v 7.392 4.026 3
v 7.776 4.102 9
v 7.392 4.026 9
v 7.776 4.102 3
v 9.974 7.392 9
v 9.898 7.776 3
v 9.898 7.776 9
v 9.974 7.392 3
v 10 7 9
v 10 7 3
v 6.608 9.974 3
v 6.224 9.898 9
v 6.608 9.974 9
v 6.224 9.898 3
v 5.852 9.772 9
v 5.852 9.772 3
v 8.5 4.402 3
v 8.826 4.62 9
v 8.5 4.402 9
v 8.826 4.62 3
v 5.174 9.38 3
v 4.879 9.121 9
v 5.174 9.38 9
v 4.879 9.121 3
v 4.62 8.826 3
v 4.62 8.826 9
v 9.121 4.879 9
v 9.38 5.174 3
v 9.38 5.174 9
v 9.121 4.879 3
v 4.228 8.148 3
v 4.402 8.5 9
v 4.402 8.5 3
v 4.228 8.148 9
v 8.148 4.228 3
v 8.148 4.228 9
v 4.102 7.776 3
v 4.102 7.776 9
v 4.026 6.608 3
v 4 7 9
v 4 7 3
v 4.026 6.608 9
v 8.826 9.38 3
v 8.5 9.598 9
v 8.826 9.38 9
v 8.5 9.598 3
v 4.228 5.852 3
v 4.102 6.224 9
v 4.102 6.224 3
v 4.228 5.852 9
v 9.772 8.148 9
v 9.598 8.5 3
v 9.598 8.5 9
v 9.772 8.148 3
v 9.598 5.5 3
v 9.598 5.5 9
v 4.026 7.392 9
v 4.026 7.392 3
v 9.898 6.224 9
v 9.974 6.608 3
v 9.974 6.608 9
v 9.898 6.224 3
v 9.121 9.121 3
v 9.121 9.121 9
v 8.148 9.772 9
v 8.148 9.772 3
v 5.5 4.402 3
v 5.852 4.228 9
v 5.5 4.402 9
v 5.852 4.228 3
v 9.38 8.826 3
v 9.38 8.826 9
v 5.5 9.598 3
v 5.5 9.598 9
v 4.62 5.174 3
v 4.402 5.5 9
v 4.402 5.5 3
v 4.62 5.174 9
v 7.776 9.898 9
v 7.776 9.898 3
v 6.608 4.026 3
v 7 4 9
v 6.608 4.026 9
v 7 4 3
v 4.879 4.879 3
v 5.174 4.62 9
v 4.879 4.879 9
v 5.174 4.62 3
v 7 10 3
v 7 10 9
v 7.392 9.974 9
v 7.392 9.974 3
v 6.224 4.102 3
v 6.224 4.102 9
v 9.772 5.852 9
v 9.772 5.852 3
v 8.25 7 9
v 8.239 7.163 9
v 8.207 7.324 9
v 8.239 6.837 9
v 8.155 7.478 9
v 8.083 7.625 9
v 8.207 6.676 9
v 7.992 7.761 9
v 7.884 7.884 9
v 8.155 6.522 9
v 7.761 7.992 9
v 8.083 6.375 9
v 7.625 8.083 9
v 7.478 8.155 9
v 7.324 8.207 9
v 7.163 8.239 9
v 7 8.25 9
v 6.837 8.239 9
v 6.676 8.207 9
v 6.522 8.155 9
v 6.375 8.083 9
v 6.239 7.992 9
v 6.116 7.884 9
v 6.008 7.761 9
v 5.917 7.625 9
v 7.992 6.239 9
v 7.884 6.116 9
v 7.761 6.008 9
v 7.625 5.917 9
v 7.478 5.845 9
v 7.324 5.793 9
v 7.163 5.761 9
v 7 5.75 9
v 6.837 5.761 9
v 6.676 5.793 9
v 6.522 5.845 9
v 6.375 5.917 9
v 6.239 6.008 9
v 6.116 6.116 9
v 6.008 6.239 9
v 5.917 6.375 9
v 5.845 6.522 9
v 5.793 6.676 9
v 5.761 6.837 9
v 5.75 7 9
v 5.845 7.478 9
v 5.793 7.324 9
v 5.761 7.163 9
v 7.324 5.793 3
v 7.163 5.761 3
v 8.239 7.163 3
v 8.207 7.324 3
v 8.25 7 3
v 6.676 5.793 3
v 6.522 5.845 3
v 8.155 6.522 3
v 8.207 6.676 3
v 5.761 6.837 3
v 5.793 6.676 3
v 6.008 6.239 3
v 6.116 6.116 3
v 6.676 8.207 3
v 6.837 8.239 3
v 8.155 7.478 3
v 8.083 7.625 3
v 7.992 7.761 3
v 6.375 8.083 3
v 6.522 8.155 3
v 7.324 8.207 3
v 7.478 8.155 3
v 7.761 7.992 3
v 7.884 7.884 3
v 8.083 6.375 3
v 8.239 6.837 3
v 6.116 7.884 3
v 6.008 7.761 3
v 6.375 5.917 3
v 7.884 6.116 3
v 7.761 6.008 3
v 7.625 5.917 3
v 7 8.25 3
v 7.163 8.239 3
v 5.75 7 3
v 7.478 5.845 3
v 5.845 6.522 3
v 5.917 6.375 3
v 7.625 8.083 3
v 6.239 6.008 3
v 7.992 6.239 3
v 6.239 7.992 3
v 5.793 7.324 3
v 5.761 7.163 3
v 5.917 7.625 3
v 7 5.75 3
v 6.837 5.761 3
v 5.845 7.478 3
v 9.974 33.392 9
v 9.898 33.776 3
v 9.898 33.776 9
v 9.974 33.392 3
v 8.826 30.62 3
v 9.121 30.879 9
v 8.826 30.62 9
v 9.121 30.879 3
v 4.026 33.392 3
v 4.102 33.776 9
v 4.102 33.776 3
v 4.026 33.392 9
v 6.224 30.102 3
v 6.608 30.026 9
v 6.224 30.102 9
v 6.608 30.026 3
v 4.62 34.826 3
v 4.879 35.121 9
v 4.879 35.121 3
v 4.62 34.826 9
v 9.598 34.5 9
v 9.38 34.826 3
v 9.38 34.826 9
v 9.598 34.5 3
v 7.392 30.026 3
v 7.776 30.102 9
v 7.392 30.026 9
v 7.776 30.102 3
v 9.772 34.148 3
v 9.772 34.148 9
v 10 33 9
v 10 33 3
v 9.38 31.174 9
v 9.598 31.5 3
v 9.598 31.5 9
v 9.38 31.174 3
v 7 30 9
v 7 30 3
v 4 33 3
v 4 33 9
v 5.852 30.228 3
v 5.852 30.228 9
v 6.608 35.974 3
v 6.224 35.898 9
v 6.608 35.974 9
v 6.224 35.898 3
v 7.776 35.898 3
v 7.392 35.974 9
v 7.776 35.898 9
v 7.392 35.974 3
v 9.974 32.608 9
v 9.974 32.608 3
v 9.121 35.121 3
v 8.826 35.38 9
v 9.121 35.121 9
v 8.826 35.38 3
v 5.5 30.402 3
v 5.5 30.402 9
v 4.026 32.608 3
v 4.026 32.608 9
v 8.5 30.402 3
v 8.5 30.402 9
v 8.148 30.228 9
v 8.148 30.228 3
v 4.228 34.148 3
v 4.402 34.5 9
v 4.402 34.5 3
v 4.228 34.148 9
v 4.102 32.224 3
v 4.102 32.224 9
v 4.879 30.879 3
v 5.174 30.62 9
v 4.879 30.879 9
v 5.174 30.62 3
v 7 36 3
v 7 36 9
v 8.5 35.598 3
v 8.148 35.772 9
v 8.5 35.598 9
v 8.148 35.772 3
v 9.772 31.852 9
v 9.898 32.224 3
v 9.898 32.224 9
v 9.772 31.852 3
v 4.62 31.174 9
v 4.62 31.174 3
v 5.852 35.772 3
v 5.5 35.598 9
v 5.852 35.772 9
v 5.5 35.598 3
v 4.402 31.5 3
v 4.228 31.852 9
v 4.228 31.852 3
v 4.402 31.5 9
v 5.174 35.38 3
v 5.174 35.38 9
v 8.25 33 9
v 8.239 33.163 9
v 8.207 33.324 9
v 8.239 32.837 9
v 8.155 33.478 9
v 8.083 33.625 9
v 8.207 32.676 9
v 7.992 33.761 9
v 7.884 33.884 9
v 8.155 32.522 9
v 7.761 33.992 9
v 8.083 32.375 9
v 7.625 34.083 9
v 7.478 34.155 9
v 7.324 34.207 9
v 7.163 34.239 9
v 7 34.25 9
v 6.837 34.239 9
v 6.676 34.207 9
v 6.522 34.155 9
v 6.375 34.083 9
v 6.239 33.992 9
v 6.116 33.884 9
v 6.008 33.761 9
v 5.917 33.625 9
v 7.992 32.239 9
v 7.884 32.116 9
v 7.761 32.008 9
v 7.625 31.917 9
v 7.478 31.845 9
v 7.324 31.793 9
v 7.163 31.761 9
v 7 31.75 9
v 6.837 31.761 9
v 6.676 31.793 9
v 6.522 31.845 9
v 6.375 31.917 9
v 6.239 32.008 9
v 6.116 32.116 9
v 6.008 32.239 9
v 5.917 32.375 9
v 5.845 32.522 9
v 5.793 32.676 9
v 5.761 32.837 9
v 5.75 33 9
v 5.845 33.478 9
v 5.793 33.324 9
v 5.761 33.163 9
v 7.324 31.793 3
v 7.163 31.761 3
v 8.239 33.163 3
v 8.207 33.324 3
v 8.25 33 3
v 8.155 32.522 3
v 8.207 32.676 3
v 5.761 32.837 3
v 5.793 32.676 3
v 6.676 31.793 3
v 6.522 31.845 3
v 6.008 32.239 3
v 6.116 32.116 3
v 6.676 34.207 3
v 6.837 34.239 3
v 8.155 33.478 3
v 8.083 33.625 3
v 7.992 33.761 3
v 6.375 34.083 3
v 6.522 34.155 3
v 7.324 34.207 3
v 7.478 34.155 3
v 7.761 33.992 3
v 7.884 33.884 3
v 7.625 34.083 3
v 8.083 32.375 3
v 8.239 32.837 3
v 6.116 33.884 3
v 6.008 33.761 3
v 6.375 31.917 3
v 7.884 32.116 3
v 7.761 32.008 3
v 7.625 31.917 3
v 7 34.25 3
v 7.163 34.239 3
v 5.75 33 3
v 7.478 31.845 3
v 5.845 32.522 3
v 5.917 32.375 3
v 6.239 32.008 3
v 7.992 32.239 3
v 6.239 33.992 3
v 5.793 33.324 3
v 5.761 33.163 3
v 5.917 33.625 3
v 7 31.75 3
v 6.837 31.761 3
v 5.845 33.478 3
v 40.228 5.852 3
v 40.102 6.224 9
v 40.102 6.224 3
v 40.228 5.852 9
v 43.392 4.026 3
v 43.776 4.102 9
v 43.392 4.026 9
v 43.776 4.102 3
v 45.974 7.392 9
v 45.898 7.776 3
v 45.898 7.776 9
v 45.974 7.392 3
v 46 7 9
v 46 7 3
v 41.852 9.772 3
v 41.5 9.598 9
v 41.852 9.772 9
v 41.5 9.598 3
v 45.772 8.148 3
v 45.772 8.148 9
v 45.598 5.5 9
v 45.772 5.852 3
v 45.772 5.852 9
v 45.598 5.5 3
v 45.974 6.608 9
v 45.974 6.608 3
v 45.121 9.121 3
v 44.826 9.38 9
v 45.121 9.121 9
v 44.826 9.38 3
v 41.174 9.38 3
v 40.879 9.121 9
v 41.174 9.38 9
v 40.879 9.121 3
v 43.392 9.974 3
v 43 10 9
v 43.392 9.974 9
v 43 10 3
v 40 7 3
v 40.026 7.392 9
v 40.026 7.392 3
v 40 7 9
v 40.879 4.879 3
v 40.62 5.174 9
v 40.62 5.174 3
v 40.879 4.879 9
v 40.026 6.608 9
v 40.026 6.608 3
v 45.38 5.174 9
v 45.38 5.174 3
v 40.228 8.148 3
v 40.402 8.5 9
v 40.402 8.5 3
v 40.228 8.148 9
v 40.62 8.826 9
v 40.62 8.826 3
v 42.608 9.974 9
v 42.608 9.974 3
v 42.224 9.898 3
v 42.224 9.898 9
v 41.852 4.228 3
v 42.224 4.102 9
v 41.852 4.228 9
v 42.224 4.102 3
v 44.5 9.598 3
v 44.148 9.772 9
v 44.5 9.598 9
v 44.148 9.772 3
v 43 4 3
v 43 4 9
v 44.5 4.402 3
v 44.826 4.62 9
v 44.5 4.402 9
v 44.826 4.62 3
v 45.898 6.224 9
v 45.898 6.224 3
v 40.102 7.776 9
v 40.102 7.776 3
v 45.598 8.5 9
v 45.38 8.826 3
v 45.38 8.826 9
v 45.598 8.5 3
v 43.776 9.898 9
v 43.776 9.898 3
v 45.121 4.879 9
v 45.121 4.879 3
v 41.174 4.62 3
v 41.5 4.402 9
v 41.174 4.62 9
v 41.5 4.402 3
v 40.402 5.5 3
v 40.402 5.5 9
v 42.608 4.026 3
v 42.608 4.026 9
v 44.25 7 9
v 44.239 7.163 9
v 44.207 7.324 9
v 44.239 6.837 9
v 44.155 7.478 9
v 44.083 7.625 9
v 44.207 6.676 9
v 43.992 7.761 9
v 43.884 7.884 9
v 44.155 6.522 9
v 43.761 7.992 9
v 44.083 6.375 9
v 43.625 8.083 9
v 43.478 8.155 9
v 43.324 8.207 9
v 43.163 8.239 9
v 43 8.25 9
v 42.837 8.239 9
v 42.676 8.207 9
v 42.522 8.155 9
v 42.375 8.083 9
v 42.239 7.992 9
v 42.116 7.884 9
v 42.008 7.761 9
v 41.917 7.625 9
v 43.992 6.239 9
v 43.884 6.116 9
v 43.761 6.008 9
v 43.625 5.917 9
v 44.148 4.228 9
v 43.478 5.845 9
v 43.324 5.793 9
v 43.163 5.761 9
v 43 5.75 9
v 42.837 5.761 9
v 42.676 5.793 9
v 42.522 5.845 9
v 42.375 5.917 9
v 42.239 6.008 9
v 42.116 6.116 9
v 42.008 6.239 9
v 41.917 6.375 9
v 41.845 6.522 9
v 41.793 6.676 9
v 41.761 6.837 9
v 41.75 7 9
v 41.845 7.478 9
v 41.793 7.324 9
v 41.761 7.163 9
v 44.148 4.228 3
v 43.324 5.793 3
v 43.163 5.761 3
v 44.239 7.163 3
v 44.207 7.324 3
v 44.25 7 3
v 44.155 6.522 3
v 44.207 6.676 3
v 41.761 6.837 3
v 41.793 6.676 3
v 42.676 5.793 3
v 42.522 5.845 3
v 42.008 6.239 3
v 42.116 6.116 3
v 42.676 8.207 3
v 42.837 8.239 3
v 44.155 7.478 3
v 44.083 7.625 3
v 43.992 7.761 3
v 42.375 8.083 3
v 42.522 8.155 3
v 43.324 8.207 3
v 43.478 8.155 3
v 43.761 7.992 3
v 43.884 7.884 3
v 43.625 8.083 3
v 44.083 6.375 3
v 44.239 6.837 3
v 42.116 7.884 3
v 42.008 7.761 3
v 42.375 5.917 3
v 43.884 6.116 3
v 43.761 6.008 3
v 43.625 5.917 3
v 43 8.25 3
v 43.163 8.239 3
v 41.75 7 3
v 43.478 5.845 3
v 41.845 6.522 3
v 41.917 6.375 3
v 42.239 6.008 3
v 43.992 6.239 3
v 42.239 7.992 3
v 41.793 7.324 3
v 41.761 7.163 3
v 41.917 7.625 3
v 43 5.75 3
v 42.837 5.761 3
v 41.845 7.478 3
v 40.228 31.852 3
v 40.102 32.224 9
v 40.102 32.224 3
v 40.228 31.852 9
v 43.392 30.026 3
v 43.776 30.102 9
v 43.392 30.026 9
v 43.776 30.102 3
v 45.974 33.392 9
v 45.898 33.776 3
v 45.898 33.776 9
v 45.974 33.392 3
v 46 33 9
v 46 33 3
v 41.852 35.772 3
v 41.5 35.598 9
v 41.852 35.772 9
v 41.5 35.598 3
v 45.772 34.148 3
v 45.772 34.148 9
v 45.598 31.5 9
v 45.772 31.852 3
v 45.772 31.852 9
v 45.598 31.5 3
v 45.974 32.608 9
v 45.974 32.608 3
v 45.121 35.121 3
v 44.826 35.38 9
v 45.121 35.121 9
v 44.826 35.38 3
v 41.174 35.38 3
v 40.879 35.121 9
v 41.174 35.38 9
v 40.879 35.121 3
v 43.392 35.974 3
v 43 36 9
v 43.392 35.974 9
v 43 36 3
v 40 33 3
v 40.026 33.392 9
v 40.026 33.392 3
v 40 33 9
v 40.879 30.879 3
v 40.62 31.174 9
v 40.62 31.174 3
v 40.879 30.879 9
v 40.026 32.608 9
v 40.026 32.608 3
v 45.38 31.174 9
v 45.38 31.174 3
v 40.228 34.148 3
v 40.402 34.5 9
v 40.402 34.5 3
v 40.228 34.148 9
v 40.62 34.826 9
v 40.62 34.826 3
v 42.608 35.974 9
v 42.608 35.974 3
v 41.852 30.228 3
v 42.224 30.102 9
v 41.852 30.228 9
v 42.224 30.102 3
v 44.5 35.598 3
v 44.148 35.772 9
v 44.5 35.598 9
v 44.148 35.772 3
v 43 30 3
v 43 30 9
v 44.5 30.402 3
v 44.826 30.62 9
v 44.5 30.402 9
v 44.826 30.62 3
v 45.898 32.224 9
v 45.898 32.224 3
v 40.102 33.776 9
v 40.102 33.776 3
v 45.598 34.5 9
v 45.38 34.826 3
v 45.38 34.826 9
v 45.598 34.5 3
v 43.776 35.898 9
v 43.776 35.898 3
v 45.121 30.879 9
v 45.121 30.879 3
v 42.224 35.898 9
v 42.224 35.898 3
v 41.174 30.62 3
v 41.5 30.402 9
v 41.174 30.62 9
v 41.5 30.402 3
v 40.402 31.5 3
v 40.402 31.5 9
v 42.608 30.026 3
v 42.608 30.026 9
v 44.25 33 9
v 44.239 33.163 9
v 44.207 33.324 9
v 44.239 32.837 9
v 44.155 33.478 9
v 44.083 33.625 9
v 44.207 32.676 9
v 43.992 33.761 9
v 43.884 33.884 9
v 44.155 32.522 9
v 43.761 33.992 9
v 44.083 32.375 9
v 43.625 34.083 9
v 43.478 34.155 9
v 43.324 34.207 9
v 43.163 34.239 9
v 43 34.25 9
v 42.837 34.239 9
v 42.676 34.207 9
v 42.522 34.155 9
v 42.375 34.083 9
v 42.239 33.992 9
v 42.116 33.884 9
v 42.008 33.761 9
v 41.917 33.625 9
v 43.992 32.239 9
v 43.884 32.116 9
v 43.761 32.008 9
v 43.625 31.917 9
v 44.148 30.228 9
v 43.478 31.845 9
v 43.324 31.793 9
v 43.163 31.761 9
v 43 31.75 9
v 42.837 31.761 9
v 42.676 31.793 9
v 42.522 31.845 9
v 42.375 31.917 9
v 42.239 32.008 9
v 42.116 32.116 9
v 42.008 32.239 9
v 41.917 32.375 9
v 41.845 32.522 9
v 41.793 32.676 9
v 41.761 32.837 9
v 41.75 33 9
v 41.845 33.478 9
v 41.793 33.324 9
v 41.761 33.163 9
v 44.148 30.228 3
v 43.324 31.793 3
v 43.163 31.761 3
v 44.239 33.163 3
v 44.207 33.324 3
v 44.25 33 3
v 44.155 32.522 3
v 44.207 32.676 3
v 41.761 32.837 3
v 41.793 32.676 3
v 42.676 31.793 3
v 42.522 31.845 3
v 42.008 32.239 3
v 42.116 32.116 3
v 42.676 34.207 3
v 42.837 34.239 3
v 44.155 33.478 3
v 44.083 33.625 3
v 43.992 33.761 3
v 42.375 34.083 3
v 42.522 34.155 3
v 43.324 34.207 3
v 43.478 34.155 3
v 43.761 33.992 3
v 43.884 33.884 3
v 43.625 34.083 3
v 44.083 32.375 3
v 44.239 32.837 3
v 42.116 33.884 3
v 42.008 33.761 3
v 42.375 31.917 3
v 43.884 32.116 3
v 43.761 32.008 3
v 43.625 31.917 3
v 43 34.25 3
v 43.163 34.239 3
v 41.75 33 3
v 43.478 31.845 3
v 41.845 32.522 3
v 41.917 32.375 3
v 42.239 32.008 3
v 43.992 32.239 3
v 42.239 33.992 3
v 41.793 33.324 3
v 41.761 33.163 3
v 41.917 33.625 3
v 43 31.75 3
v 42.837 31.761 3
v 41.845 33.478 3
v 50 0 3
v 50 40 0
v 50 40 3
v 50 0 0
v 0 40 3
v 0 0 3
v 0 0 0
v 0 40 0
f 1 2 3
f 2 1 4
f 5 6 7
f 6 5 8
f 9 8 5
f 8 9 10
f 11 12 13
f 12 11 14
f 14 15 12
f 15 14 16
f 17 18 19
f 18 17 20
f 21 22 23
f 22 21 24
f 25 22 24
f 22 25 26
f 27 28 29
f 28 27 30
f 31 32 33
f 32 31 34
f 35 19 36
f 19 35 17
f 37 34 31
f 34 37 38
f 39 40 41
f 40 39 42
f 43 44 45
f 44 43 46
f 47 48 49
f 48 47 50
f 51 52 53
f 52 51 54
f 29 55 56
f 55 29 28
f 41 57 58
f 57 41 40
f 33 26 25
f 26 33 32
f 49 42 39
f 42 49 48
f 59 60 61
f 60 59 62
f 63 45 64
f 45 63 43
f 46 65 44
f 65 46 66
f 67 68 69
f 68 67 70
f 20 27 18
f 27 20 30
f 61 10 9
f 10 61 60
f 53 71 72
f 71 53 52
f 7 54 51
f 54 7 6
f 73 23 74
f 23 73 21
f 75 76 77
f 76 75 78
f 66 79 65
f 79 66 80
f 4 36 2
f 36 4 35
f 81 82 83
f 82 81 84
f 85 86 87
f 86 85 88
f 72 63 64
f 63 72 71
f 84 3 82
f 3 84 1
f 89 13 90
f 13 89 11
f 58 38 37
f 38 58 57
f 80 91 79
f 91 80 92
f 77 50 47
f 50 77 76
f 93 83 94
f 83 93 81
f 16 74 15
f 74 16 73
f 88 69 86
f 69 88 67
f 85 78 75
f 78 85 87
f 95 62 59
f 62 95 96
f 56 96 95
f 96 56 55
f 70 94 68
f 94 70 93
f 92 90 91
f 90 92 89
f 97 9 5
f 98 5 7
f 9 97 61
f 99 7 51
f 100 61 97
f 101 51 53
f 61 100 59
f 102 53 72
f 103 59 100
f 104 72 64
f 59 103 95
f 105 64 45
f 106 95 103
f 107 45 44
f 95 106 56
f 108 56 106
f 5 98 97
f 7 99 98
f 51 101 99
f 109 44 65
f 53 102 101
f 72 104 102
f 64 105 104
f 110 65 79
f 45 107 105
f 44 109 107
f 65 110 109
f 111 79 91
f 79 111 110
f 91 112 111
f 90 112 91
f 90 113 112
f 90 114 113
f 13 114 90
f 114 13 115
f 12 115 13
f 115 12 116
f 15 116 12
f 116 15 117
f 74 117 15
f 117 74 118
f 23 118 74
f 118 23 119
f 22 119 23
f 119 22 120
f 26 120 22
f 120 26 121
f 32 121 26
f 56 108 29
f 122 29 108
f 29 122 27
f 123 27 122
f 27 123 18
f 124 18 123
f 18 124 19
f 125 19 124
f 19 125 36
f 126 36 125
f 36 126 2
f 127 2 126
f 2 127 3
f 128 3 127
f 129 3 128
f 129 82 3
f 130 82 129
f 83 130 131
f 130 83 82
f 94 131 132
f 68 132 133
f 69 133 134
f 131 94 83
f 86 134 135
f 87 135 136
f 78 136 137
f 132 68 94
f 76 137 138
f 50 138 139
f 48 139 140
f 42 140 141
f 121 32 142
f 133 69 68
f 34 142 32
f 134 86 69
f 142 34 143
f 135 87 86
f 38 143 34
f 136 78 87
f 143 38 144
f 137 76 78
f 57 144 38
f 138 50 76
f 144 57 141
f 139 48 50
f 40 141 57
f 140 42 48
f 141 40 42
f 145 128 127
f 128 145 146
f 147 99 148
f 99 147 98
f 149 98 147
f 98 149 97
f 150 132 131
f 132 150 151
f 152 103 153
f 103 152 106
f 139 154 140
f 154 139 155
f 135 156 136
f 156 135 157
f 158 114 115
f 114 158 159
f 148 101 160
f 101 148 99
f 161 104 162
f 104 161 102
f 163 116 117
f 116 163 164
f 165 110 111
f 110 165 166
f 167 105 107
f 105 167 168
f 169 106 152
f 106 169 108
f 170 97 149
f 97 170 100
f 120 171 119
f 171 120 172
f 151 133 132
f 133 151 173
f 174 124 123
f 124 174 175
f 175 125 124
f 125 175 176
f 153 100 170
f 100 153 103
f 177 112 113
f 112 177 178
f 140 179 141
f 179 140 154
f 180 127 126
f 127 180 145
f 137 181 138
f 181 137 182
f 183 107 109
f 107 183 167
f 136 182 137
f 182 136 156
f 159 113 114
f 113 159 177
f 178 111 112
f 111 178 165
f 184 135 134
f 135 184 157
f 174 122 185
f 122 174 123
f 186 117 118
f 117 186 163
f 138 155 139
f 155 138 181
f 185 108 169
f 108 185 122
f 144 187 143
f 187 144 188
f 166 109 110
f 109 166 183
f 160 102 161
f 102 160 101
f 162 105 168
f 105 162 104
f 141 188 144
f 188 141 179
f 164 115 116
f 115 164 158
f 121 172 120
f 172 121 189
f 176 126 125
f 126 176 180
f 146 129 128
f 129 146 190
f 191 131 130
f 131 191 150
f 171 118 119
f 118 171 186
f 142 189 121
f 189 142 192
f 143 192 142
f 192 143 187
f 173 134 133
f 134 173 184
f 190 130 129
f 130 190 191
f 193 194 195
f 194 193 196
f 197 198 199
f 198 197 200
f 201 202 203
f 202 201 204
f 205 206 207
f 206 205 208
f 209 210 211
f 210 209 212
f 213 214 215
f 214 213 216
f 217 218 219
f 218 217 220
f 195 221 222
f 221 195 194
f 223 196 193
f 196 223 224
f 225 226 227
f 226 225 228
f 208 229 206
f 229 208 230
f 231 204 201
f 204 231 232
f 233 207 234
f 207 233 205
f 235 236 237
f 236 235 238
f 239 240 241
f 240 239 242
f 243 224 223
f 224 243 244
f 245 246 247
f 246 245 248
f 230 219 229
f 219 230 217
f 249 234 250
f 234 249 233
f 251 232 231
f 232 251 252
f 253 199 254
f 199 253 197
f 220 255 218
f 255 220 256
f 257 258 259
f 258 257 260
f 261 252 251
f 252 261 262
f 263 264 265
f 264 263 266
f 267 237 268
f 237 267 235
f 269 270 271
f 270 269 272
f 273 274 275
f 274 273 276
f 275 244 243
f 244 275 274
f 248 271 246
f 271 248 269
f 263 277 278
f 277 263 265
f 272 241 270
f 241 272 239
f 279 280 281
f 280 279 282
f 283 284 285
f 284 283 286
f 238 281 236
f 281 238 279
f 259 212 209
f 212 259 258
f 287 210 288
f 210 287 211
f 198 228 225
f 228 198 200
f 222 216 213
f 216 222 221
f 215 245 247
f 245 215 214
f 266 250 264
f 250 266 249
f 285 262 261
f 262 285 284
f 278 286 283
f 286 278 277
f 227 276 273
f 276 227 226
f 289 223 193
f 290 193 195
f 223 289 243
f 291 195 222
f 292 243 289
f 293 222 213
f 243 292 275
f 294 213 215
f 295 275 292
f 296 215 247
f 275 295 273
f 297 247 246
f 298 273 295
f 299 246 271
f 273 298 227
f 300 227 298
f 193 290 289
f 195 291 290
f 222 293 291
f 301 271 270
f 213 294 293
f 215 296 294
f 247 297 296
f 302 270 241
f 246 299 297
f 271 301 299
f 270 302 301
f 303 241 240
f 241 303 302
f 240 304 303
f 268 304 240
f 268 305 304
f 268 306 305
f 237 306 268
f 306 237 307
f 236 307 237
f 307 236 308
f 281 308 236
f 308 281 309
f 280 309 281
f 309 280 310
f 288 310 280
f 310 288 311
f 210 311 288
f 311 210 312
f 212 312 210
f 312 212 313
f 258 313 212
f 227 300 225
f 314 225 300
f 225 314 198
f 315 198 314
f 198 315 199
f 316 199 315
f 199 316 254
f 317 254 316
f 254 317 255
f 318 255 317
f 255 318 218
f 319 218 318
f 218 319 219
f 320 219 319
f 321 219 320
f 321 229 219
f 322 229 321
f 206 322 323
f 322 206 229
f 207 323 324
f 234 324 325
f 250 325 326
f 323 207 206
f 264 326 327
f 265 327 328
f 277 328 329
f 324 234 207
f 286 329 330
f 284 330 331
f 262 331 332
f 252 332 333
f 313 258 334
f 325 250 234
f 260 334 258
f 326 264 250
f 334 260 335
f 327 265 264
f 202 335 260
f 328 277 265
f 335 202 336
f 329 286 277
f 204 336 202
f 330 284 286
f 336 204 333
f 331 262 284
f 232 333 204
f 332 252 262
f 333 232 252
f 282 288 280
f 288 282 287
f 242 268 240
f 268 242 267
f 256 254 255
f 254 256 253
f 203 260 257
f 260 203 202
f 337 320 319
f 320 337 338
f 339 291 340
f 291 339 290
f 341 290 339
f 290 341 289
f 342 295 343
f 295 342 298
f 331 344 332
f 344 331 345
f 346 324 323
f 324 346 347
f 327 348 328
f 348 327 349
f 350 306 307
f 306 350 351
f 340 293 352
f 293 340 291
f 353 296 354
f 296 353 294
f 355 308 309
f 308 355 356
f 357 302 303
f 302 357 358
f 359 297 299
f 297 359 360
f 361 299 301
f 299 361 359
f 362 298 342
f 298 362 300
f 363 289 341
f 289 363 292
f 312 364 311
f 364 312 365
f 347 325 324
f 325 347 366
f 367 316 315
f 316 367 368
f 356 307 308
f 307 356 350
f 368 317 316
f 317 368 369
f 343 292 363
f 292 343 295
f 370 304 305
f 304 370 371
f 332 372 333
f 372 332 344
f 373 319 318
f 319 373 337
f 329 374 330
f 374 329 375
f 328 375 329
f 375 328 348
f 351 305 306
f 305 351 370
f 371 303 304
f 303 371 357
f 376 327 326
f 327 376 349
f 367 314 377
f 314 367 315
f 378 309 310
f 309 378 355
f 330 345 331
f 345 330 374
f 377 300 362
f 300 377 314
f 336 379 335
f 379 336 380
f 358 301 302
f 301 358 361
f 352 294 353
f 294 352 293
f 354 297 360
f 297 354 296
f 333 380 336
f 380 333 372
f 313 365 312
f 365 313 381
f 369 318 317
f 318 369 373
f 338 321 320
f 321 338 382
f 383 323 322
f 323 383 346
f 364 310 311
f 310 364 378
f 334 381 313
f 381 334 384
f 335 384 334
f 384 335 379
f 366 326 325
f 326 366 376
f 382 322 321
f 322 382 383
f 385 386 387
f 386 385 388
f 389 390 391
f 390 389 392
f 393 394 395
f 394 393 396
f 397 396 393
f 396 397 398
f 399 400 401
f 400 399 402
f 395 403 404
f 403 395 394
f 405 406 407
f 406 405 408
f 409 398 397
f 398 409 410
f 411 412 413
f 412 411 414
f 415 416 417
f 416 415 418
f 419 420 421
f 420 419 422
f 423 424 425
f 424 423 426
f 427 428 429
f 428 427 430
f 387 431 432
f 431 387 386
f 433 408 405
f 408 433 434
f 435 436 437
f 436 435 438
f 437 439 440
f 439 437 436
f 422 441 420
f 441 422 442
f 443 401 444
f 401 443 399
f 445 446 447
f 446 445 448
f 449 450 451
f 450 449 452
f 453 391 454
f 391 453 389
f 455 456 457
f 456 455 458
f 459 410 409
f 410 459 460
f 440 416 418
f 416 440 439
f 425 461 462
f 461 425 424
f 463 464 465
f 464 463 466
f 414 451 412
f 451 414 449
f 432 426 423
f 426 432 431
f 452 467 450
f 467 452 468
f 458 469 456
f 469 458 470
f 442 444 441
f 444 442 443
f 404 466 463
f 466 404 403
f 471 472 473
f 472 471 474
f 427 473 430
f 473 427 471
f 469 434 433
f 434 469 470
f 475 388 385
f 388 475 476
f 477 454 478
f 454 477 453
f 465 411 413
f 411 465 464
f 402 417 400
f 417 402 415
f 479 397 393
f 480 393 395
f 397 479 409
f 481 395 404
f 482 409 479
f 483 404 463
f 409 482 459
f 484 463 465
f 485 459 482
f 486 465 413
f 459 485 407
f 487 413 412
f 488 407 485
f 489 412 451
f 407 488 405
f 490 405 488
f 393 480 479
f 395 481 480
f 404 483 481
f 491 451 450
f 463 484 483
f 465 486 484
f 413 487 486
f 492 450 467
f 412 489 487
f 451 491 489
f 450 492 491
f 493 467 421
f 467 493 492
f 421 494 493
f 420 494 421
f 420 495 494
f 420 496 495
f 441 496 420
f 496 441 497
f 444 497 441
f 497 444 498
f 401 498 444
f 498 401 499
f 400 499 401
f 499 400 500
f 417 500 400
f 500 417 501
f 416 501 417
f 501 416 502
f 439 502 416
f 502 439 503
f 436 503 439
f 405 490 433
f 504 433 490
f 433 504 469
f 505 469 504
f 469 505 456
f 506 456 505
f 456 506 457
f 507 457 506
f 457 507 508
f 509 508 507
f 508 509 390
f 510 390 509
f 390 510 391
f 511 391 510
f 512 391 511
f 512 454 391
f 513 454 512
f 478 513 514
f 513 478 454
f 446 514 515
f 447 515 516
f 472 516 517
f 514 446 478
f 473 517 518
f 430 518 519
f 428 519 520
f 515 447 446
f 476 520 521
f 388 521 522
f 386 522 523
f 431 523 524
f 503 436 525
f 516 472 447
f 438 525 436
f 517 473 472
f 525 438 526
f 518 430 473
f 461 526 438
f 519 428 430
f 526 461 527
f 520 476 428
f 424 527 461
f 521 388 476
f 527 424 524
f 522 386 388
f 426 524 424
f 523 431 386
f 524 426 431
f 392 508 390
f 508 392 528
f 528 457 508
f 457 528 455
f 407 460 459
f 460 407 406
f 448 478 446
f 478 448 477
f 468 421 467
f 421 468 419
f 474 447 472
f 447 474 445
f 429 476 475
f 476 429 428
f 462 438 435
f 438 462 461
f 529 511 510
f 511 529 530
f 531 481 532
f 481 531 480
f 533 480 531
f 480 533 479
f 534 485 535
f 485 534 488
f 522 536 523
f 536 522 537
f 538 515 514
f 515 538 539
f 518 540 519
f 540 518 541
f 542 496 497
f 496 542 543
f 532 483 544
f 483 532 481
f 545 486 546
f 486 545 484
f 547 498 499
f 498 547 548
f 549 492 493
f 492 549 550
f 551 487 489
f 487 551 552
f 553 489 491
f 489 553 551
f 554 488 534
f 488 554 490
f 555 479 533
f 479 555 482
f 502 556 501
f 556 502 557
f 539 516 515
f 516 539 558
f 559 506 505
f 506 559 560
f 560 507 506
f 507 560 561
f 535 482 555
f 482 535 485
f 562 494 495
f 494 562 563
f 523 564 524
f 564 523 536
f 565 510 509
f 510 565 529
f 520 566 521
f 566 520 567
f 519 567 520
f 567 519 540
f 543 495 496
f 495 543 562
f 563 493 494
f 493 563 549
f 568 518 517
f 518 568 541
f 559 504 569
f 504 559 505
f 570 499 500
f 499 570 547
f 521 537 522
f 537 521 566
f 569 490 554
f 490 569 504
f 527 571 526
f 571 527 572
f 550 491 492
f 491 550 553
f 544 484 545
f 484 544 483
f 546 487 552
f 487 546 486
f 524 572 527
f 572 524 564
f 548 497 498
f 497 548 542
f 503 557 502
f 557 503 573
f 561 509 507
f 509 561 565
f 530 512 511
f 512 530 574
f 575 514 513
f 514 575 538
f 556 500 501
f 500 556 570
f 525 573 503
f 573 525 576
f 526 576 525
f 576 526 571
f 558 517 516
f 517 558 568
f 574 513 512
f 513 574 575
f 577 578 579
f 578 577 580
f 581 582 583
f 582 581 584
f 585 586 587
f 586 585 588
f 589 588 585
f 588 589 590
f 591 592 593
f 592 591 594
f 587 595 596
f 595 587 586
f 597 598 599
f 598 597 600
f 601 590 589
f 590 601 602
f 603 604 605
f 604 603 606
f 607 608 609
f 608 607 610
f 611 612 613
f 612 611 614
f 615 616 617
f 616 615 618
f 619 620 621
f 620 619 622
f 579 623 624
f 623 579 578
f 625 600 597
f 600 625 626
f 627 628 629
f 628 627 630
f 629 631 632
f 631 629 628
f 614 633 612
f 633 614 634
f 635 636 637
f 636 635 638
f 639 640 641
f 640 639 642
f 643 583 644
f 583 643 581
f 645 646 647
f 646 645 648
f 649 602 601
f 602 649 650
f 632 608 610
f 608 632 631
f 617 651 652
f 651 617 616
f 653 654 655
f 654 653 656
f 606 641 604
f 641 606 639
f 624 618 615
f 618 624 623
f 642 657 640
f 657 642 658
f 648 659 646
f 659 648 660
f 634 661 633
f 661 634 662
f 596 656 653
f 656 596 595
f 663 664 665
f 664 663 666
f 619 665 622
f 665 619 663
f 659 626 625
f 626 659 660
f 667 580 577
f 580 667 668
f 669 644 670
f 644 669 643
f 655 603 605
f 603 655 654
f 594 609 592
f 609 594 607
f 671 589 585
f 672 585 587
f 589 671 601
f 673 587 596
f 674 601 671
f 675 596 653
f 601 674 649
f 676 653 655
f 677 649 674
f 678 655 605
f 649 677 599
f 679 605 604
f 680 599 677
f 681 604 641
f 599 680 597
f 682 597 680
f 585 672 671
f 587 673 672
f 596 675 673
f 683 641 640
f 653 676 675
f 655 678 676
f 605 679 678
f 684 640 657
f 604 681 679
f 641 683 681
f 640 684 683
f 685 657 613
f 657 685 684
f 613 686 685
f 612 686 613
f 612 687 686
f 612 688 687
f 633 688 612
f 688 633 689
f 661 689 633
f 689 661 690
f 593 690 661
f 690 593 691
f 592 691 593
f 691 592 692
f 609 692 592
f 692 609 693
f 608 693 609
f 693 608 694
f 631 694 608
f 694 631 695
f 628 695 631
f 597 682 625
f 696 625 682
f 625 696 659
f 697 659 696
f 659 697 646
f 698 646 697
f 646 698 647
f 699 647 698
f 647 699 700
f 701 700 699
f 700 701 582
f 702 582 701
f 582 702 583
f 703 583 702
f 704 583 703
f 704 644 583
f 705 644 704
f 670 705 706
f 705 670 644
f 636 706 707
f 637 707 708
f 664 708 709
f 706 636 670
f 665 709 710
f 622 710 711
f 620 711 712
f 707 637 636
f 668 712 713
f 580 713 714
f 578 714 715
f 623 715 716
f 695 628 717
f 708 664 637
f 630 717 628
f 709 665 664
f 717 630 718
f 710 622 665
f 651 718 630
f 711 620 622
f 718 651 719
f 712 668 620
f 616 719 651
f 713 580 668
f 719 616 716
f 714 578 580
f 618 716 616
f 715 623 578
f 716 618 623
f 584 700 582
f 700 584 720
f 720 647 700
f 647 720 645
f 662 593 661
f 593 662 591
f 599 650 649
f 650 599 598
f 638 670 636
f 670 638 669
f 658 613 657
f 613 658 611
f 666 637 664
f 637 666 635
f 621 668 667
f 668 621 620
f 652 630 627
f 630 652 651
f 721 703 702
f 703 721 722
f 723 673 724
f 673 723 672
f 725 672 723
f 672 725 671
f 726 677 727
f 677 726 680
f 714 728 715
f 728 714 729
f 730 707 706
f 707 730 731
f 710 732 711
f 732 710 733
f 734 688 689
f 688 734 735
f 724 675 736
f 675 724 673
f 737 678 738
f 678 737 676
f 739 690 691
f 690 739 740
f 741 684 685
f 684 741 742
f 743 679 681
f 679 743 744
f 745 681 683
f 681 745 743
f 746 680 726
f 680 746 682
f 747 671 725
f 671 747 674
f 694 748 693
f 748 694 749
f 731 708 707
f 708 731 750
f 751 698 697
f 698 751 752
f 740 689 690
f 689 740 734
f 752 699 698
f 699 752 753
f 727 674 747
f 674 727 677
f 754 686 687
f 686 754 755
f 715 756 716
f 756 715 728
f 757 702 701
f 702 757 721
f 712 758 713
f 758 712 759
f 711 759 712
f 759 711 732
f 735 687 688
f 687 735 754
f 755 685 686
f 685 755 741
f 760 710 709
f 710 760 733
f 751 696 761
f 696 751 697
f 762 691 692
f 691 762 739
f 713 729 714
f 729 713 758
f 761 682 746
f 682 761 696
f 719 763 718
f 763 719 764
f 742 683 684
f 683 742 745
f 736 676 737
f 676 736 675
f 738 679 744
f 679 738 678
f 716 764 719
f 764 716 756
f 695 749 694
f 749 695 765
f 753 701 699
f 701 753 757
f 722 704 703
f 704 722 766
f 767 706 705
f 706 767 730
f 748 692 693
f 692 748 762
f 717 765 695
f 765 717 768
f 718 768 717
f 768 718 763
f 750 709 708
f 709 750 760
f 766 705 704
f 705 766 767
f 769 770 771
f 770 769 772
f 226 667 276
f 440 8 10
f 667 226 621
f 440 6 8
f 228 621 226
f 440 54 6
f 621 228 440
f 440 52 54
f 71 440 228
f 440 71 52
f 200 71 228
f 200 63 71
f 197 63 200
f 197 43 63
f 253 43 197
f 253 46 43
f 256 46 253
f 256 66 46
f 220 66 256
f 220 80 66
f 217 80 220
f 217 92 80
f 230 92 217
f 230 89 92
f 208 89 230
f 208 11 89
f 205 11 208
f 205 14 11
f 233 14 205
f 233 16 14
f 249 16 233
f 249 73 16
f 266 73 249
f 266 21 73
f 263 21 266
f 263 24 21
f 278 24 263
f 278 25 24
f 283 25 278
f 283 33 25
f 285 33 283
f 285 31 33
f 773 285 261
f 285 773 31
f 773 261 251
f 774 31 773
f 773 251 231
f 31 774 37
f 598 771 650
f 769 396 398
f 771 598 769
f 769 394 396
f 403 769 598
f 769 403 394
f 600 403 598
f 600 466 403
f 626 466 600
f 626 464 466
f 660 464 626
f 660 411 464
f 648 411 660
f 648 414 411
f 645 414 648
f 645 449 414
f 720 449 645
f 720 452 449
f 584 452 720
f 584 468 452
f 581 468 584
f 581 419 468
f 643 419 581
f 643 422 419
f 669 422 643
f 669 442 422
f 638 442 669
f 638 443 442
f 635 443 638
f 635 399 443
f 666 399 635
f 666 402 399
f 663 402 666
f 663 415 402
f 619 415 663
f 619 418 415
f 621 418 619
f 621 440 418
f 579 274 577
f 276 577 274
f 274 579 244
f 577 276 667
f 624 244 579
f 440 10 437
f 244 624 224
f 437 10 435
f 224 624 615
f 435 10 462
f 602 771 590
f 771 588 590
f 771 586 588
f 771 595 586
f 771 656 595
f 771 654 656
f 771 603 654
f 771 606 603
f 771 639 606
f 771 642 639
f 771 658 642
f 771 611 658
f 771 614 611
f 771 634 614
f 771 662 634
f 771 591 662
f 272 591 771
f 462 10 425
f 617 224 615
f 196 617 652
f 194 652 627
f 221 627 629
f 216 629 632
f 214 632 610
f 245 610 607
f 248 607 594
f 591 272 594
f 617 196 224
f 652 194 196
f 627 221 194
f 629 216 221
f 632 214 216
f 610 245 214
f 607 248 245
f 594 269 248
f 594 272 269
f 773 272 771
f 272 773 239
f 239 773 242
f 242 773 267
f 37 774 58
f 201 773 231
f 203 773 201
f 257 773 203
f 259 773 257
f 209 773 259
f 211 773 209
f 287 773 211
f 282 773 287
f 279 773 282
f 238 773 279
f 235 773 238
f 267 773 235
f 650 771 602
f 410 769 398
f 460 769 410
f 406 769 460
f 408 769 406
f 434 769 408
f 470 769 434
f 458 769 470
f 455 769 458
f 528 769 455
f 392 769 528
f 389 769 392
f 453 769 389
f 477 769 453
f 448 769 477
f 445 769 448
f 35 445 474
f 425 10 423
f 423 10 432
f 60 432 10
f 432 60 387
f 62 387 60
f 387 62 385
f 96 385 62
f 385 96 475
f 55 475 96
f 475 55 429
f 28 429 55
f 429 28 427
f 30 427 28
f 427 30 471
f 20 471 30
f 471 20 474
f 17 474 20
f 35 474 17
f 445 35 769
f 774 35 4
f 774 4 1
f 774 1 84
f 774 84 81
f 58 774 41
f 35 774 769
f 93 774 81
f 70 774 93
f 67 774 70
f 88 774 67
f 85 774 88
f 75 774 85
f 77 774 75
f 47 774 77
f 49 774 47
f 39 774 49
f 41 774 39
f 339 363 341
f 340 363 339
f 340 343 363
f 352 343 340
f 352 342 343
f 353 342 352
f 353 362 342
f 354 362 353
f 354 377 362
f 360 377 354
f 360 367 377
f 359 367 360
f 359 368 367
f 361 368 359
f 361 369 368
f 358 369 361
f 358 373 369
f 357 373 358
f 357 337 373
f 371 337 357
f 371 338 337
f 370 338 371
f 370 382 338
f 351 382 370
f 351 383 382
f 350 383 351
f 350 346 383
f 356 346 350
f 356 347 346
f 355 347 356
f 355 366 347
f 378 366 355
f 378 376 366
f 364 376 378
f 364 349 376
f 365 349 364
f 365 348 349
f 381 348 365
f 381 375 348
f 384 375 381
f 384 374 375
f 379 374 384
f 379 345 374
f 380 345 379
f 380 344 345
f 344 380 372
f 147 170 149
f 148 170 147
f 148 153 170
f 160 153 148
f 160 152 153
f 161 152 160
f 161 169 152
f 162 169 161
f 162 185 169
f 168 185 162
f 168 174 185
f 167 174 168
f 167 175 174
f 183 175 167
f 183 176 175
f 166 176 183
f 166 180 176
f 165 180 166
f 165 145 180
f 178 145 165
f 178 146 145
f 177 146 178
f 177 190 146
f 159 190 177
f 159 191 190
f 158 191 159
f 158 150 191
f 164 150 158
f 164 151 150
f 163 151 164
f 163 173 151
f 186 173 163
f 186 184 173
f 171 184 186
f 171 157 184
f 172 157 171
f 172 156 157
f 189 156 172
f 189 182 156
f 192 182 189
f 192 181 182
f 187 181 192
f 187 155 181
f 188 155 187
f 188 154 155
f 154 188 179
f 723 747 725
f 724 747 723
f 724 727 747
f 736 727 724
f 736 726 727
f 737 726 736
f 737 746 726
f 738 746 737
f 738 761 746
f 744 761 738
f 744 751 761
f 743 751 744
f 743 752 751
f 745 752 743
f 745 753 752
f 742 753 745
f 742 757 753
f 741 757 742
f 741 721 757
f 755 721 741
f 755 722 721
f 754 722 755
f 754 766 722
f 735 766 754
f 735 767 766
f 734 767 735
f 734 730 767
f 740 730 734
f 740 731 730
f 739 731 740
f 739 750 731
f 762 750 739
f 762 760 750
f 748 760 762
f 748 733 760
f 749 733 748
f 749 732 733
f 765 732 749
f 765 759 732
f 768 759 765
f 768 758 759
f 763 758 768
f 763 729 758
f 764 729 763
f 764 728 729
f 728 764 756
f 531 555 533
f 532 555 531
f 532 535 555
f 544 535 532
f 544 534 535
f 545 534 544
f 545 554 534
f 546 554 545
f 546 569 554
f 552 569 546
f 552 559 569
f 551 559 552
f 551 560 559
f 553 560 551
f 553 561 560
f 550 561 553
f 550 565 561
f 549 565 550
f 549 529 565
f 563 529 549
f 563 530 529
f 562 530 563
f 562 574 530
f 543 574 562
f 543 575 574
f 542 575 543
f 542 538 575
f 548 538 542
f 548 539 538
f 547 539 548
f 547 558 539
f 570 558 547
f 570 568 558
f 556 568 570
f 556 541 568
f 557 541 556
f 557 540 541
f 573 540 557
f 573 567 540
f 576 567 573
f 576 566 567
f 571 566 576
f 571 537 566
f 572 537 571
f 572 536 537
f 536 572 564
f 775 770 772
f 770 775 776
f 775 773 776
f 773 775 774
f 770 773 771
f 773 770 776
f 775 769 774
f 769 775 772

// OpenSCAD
// units=mm — generated by scad_emitter.py
// part=unnamed
$fn = 48;

union() { cube([50, 40, 3]); difference() { translate([7, 7, 2.5]) rotate([0, 0, 0]) cylinder(h=6.5, r=3, $fn=$fn); translate([7, 7, 2.5]) rotate([0, 0, 0]) cylinder(h=7, r=1.25, $fn=$fn); } difference() { translate([7, 33, 2.5]) rotate([0, 0, 0]) cylinder(h=6.5, r=3, $fn=$fn); translate([7, 33, 2.5]) rotate([0, 0, 0]) cylinder(h=7, r=1.25, $fn=$fn); } difference() { translate([43, 7, 2.5]) rotate([0, 0, 0]) cylinder(h=6.5, r=3, $fn=$fn); translate([43, 7, 2.5]) rotate([0, 0, 0]) cylinder(h=7, r=1.25, $fn=$fn); } difference() { translate([43, 33, 2.5]) rotate([0, 0, 0]) cylinder(h=6.5, r=3, $fn=$fn); translate([43, 33, 2.5]) rotate([0, 0, 0]) cylinder(h=7, r=1.25, $fn=$fn); } }
